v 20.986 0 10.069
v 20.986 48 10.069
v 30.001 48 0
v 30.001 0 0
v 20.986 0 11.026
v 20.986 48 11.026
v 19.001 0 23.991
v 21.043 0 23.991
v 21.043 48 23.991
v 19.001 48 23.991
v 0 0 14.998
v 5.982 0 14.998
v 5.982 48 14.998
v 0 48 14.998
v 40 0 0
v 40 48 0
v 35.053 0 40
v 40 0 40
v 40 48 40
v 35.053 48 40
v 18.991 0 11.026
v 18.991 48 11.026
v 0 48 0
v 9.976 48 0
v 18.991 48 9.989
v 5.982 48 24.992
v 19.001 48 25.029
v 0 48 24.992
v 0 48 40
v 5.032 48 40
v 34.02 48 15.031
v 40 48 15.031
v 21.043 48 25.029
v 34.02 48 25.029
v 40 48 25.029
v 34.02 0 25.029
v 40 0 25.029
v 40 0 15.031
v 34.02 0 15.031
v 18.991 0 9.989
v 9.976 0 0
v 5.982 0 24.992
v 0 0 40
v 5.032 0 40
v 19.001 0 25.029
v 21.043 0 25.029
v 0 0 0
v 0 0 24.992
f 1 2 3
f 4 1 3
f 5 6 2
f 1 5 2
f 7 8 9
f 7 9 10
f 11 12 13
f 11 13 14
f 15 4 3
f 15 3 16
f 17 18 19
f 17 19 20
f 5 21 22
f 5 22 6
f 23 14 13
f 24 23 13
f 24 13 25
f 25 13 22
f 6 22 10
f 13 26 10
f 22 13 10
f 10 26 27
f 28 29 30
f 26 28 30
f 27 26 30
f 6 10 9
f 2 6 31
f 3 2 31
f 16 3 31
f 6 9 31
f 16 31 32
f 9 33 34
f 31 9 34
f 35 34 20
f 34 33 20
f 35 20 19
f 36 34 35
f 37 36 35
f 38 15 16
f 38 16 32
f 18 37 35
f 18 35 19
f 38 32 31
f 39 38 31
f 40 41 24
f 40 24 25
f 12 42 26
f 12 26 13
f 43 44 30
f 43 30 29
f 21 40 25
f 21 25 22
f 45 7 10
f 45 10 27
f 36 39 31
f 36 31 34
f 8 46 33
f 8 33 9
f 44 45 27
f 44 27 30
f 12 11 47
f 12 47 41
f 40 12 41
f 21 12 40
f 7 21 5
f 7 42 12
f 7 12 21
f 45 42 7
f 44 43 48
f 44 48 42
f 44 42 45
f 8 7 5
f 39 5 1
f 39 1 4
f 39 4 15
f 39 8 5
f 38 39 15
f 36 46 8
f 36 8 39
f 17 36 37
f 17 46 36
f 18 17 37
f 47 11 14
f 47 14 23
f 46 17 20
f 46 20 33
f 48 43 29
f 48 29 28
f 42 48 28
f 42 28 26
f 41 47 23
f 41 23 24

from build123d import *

# Parameters (mm, degrees)
F1_DEPTH = 48


with BuildPart() as f1:
    # F0 (on Front) → F1 (new body)
    with BuildSketch(Plane.XZ):
        Polygon((0, 14.997751), (0, 0), (9.975666, 0), (18.991238, 9.989237), (18.991238, 11.026427), (20, 11.026427), (20.985832, 11.026427), (20.985832, 10.069021), (30.001402, 0), (40, 0), (40, 15.031243), (34.019962, 15.031243), (34.019962, 25.028992), (40, 25.028992), (40, 40), (35.052698, 40), (21.043338, 25.028992), (21.043338, 23.991385), (20.042421, 23.991385), (19.001365, 23.991385), (19.001365, 25.028992), (5.032144, 40), (0, 40), (0, 24.992259), (5.982323, 24.992259), (5.982323, 14.997751), align=None)
    extrude(amount=-F1_DEPTH)


solid = f1.part
